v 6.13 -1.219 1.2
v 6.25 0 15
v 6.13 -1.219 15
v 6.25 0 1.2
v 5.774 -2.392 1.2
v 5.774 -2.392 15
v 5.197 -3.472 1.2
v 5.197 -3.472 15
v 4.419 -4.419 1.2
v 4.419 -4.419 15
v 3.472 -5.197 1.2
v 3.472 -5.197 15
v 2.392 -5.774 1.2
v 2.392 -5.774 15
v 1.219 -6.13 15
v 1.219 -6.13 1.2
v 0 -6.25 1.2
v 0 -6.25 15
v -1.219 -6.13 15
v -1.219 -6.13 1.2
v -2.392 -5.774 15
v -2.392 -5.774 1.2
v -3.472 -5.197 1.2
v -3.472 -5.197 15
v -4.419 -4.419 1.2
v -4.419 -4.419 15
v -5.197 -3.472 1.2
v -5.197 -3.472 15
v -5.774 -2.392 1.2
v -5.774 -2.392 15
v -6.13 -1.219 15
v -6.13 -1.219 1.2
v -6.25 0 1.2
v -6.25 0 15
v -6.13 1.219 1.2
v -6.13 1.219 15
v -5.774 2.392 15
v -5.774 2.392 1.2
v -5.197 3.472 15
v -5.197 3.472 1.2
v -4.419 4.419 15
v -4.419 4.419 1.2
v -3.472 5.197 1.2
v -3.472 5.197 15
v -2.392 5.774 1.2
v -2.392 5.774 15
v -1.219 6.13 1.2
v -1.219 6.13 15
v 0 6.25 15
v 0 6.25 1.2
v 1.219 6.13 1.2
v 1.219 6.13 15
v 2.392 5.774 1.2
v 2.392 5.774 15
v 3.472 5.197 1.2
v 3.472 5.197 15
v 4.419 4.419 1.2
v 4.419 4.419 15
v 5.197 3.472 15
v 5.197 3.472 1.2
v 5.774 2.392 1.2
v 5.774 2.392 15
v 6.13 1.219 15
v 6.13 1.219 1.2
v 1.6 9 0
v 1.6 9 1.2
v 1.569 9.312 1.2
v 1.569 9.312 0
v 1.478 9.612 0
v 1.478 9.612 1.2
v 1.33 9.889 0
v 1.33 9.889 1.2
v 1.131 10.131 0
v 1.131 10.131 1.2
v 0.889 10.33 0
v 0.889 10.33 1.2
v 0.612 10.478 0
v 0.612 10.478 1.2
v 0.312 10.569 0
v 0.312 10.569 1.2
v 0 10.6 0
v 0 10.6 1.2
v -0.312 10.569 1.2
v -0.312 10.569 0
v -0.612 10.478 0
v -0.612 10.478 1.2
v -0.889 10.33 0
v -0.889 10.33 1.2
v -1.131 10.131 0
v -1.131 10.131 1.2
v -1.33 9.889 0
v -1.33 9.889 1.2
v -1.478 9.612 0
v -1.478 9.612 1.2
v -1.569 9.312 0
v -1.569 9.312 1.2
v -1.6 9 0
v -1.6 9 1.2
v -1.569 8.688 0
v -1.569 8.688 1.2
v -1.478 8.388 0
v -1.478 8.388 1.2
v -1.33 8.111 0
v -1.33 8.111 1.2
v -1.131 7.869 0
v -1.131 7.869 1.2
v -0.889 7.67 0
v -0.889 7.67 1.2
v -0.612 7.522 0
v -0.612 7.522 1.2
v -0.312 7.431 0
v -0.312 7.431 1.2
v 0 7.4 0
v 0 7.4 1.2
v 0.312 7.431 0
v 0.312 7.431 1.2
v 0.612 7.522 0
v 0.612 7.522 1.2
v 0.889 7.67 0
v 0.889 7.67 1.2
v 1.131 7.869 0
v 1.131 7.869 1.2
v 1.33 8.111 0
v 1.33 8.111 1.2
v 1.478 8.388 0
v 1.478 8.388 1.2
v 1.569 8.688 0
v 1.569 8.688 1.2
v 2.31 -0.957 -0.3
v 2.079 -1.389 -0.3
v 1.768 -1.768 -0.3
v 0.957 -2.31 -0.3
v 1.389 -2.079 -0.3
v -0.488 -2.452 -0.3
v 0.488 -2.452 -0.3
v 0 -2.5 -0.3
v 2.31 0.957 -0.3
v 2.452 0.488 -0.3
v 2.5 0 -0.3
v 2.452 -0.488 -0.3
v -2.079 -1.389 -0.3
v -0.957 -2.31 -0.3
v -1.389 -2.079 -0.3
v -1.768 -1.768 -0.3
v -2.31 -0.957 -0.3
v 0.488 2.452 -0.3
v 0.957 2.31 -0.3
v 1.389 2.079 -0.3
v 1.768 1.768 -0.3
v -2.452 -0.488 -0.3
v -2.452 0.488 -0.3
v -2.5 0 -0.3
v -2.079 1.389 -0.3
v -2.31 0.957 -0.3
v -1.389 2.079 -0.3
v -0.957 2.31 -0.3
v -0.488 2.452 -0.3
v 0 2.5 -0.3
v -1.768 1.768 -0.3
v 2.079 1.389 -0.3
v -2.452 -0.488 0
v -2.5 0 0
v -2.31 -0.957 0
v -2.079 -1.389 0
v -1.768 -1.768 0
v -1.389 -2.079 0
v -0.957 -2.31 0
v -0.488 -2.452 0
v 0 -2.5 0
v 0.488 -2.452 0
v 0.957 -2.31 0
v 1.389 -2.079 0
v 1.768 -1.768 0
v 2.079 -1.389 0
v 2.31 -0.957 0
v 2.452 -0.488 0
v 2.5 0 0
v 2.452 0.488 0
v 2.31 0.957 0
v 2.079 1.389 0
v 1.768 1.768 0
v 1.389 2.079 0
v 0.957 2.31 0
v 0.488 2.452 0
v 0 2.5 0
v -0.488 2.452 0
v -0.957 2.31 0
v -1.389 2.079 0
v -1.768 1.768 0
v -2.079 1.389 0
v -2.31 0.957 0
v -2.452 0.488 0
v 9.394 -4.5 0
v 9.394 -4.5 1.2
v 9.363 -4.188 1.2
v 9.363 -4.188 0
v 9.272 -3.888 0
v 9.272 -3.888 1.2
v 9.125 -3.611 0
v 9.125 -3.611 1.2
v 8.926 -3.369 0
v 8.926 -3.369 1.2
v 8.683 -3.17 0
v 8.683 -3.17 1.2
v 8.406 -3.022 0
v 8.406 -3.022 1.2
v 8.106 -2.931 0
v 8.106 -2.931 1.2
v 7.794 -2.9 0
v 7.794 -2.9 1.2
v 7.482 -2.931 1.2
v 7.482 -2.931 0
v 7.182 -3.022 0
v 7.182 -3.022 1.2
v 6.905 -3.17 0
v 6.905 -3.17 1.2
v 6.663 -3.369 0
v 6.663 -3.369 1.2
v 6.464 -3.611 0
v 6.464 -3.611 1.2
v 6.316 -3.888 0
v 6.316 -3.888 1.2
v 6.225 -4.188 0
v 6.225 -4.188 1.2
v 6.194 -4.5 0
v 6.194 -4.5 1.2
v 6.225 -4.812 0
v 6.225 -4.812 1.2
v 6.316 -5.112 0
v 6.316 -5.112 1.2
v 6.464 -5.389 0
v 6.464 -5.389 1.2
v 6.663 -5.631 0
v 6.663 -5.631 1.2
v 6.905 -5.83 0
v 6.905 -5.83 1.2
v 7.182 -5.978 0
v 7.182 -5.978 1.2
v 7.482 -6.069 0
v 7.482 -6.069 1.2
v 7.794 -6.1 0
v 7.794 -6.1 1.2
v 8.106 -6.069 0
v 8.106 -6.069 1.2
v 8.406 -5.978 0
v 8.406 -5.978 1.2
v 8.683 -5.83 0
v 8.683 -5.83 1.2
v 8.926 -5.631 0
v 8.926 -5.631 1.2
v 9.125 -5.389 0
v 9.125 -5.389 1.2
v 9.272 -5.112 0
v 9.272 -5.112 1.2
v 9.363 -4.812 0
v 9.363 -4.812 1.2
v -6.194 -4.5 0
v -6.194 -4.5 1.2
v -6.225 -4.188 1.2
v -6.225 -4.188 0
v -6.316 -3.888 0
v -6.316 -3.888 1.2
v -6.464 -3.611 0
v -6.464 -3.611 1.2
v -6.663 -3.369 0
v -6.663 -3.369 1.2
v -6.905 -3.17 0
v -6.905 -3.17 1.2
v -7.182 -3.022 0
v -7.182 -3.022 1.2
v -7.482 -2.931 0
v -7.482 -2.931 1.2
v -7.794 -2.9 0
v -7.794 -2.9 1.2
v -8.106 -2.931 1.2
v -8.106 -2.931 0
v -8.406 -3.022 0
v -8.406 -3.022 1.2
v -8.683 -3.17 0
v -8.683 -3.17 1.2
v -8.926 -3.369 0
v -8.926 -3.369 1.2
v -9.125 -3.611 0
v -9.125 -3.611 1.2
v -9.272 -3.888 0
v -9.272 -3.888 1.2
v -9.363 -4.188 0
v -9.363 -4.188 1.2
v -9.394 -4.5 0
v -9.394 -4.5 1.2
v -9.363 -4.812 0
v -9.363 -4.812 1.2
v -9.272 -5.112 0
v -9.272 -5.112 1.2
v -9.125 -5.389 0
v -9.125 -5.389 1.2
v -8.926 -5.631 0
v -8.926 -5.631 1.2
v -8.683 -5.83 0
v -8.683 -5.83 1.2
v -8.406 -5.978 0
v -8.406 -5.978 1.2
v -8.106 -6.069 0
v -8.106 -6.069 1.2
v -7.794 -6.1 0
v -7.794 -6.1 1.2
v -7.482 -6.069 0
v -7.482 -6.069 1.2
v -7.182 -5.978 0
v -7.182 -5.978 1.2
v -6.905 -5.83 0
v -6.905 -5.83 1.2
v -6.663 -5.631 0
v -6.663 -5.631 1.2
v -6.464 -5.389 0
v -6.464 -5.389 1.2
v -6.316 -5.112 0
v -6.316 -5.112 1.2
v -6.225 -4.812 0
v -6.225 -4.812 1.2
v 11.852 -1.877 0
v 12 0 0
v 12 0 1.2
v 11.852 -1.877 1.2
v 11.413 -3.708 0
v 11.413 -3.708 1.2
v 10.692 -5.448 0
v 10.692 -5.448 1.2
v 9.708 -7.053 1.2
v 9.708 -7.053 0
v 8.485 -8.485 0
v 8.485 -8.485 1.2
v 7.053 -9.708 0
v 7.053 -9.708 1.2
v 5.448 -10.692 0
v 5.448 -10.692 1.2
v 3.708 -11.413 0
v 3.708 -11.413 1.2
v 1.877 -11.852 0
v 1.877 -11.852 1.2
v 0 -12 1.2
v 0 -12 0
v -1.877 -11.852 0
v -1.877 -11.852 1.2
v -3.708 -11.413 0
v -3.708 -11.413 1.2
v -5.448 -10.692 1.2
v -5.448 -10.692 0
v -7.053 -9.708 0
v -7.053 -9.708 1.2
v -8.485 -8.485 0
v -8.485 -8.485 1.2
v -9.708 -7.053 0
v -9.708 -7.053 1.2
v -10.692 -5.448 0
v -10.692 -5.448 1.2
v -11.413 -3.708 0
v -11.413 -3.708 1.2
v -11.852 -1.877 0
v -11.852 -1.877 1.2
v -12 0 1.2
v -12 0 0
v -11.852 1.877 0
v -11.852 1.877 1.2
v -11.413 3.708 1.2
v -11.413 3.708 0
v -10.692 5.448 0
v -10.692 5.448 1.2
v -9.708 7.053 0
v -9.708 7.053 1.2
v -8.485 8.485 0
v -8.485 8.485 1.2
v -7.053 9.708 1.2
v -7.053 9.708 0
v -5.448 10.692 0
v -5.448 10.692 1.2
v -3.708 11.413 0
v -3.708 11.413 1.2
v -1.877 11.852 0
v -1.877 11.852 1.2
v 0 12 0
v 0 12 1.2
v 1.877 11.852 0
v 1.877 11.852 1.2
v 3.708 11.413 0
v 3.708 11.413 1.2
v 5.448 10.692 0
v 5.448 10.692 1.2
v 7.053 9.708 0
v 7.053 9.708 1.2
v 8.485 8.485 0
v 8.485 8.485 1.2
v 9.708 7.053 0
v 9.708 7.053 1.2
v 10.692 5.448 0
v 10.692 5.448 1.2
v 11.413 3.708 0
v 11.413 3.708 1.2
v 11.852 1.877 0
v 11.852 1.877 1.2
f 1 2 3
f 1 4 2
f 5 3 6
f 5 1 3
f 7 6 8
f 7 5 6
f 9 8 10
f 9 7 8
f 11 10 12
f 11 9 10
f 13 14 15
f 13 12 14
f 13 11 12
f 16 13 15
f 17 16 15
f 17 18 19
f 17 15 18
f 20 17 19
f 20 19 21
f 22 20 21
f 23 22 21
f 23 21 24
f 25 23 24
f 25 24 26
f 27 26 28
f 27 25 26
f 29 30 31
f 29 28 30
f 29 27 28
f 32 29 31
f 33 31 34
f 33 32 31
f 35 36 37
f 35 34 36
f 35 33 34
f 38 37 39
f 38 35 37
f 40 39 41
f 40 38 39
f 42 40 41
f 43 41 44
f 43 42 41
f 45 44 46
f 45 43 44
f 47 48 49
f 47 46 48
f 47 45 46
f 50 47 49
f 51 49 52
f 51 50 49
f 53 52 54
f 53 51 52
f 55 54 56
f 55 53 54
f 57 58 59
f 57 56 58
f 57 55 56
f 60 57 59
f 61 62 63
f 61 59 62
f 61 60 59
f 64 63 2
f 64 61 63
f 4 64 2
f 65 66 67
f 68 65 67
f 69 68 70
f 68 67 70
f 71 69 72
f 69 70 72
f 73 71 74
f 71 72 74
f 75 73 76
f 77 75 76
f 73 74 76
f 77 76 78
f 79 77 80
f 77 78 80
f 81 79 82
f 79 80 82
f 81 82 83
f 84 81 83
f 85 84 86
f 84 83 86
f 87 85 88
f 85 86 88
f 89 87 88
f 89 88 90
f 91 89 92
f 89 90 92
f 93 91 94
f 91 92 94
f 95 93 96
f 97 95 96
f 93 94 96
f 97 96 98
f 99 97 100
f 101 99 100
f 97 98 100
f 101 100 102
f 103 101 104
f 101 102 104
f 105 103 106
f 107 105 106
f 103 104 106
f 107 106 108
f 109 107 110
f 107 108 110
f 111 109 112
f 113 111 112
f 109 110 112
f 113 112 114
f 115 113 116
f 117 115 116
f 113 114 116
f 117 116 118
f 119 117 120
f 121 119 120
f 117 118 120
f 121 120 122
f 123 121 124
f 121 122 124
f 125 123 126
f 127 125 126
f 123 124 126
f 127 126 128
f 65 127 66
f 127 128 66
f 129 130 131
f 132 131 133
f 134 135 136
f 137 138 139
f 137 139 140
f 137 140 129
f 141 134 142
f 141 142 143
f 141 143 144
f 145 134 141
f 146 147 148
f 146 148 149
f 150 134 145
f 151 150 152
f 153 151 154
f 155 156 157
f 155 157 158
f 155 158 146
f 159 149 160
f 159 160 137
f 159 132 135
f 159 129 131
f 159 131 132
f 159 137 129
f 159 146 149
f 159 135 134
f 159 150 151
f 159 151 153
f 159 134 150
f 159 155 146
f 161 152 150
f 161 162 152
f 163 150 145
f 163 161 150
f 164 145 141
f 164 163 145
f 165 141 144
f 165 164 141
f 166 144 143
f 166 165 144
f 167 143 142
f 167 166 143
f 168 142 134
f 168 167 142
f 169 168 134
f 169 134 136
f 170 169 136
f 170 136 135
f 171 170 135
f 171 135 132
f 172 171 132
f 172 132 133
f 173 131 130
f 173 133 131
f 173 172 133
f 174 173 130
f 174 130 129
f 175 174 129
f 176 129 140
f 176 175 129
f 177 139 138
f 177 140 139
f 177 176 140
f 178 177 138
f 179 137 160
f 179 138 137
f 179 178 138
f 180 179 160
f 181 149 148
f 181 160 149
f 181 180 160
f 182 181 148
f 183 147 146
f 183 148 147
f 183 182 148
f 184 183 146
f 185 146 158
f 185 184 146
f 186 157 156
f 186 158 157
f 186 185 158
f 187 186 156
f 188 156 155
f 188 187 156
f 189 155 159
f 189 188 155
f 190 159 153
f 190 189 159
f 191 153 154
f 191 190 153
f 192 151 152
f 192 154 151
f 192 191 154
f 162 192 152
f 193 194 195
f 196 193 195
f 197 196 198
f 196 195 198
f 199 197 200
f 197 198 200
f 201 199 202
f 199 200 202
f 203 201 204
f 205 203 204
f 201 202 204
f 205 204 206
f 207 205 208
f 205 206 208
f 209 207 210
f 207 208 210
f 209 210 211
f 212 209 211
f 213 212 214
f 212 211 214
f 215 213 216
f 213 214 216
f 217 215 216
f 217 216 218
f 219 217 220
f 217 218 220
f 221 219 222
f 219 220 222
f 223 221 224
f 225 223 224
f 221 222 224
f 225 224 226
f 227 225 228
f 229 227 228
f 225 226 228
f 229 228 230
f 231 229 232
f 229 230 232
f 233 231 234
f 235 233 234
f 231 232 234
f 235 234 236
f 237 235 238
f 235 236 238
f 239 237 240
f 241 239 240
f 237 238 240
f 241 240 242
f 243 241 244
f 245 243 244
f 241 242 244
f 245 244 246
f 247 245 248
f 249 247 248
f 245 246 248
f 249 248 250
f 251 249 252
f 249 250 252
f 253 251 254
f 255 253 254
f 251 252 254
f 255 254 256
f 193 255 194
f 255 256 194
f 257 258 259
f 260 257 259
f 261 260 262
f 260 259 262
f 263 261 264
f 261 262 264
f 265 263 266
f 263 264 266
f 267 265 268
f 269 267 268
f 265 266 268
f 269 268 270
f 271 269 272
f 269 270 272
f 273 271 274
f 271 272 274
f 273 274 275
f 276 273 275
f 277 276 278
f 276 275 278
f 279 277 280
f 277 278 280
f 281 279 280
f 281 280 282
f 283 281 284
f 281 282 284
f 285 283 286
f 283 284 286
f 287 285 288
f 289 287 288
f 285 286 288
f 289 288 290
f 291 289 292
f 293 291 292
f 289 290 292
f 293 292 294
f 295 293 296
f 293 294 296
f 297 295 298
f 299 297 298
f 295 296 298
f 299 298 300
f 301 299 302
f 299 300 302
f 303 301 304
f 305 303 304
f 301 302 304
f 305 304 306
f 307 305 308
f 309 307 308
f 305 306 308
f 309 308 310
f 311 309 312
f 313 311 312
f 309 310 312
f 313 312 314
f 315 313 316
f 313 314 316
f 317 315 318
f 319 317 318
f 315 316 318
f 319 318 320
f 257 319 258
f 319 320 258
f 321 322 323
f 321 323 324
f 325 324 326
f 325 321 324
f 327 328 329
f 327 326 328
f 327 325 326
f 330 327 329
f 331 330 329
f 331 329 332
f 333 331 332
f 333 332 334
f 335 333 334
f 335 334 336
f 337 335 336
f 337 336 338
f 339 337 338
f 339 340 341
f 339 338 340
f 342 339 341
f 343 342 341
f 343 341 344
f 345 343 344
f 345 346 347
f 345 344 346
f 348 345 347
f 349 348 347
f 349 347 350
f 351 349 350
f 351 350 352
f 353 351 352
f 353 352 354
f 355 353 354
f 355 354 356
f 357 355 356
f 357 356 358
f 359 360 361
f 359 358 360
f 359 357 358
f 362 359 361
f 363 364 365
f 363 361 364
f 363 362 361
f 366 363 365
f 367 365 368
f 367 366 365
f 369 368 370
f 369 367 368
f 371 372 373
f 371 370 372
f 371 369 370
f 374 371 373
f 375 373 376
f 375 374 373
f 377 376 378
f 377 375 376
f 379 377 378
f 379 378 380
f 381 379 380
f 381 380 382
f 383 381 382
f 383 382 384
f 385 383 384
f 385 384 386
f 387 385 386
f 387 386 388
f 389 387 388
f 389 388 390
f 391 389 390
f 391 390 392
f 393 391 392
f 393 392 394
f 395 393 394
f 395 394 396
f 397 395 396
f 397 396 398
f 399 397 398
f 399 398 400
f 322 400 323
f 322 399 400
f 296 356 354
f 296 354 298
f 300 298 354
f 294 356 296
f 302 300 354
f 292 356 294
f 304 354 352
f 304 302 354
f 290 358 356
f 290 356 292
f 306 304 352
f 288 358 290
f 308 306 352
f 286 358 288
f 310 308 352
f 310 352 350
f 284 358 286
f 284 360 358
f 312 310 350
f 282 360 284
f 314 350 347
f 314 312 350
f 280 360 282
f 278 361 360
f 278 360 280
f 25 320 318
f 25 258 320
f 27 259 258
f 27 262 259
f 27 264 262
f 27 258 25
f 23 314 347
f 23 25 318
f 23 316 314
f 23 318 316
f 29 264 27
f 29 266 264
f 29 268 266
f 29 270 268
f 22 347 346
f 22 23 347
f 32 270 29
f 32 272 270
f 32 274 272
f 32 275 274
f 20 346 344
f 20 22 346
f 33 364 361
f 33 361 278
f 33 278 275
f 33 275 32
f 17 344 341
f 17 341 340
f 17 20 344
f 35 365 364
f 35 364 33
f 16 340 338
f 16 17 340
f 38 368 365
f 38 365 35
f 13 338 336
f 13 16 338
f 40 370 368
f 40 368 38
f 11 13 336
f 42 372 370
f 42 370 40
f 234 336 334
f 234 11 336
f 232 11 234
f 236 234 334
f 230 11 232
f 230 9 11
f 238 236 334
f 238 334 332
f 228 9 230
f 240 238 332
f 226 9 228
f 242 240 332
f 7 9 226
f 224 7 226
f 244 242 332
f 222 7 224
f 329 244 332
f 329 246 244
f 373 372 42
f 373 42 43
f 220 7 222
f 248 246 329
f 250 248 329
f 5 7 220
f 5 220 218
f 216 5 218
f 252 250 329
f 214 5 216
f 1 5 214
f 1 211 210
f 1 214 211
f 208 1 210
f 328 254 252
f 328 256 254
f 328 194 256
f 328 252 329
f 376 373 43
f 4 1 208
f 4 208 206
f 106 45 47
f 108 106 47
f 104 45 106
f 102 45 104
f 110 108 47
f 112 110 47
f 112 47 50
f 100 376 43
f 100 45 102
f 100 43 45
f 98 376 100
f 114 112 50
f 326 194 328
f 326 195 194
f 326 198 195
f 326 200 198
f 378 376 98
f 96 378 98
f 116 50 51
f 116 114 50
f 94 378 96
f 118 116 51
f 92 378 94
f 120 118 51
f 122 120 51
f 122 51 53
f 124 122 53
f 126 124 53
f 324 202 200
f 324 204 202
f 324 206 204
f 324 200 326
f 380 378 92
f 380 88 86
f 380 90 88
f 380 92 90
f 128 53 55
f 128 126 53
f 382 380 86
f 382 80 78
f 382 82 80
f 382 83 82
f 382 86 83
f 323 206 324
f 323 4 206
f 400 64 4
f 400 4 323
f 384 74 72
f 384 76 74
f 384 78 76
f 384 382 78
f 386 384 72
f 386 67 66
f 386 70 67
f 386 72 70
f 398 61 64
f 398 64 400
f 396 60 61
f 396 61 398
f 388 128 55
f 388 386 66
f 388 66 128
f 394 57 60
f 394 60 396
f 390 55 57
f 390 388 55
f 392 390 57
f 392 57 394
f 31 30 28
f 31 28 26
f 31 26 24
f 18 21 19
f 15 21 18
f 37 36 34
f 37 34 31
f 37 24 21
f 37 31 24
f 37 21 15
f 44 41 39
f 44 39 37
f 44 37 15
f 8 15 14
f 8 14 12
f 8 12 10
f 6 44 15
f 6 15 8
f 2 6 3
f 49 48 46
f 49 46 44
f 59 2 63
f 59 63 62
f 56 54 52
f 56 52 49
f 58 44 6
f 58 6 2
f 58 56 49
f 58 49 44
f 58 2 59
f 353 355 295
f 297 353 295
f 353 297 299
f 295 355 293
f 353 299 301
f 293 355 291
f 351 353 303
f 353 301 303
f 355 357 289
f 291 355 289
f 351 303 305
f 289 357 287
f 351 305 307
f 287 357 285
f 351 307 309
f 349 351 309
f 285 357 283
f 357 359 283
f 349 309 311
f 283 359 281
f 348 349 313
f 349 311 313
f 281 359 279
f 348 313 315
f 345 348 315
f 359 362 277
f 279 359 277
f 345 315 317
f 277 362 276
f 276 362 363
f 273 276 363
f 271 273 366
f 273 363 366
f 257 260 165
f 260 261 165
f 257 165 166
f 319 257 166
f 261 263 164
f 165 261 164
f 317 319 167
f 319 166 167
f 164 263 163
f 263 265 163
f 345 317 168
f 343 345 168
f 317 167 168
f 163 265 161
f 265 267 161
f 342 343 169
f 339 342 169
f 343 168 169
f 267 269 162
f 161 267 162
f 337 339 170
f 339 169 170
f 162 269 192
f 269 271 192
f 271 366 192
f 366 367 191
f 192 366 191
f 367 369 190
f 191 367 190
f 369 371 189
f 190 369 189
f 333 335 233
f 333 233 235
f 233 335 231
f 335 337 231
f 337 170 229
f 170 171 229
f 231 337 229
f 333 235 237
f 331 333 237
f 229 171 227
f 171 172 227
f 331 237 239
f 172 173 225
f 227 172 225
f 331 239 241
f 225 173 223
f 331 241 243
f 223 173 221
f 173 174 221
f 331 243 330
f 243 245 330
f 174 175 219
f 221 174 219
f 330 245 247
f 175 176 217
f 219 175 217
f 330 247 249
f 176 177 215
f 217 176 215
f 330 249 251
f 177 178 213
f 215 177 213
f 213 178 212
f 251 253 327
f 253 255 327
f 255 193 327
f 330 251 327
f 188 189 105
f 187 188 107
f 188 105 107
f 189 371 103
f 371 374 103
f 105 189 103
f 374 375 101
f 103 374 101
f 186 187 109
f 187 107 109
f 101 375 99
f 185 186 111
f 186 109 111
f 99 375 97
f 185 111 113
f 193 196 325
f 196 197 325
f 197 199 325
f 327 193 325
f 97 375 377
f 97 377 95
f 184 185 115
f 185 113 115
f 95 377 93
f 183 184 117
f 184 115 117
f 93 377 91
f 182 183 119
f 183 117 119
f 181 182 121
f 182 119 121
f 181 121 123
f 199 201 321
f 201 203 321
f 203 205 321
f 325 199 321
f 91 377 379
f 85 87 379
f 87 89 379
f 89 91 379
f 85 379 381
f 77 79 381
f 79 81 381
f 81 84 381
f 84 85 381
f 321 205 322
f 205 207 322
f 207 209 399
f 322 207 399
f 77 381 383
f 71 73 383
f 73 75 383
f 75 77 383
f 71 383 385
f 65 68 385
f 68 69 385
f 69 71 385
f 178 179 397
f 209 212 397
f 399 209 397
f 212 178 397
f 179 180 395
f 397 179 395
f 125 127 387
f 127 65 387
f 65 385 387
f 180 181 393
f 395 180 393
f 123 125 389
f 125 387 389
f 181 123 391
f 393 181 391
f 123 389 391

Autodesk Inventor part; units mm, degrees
ref_plane "YZ Plane" through (0, 0, 0) normal (1, 0, 0) x (0, 1, 0)
ref_plane "XZ Plane" through (0, 0, 0) normal (0, 1, 0) x (-1, 0, 0)
ref_plane "XY Plane" through (0, 0, 0) normal (0, 0, 1) x (1, 0, 0)
sketch "Náčrt1" plane through (0, 0, 0) normal (0, 0, 1) x (1, 0, 0)
  circle A0 centre (0, 0) radius 12
  dimension "d0" = 24
extrude "Vysunutí1" add sketch "Náčrt1" along normal blind 1.2
sketch "Náčrt2" plane through (0, 0, 1.2) normal (0, 0, 1) x (1, 0, 0)
  circle A0 centre (0, 0) radius 9 construction
  circle A1 centre (0, 9) radius 1.6
  circle A2 centre (-7.7942, -4.5) radius 1.6
  circle A3 centre (7.7942, -4.5) radius 1.6
  dimension "d3" = 18
  dimension "d4" = 3.2
  dimension "d7" = 360
extrude "Vysunutí2" cut sketch "Náčrt2" against normal through all
sketch "Náčrt3" plane through (0, 0, 1.2) normal (0, 0, 1) x (1, 0, 0)
  circle A0 centre (0, 0) radius 6.25
  dimension "d11" = 12.5
extrude "Vysunutí3" add sketch "Náčrt3" along normal blind 13.8
sketch "Náčrt4" plane through (0, 0, 0) normal (0, 0, -1) x (-1, 0, 0)
  circle A0 centre (0, 0) radius 2.5
  dimension "d14" = 5
extrude "Vysunutí4" add sketch "Náčrt4" along normal blind 0.3
properties part number "OtocnaKontaktniPruchodka"
